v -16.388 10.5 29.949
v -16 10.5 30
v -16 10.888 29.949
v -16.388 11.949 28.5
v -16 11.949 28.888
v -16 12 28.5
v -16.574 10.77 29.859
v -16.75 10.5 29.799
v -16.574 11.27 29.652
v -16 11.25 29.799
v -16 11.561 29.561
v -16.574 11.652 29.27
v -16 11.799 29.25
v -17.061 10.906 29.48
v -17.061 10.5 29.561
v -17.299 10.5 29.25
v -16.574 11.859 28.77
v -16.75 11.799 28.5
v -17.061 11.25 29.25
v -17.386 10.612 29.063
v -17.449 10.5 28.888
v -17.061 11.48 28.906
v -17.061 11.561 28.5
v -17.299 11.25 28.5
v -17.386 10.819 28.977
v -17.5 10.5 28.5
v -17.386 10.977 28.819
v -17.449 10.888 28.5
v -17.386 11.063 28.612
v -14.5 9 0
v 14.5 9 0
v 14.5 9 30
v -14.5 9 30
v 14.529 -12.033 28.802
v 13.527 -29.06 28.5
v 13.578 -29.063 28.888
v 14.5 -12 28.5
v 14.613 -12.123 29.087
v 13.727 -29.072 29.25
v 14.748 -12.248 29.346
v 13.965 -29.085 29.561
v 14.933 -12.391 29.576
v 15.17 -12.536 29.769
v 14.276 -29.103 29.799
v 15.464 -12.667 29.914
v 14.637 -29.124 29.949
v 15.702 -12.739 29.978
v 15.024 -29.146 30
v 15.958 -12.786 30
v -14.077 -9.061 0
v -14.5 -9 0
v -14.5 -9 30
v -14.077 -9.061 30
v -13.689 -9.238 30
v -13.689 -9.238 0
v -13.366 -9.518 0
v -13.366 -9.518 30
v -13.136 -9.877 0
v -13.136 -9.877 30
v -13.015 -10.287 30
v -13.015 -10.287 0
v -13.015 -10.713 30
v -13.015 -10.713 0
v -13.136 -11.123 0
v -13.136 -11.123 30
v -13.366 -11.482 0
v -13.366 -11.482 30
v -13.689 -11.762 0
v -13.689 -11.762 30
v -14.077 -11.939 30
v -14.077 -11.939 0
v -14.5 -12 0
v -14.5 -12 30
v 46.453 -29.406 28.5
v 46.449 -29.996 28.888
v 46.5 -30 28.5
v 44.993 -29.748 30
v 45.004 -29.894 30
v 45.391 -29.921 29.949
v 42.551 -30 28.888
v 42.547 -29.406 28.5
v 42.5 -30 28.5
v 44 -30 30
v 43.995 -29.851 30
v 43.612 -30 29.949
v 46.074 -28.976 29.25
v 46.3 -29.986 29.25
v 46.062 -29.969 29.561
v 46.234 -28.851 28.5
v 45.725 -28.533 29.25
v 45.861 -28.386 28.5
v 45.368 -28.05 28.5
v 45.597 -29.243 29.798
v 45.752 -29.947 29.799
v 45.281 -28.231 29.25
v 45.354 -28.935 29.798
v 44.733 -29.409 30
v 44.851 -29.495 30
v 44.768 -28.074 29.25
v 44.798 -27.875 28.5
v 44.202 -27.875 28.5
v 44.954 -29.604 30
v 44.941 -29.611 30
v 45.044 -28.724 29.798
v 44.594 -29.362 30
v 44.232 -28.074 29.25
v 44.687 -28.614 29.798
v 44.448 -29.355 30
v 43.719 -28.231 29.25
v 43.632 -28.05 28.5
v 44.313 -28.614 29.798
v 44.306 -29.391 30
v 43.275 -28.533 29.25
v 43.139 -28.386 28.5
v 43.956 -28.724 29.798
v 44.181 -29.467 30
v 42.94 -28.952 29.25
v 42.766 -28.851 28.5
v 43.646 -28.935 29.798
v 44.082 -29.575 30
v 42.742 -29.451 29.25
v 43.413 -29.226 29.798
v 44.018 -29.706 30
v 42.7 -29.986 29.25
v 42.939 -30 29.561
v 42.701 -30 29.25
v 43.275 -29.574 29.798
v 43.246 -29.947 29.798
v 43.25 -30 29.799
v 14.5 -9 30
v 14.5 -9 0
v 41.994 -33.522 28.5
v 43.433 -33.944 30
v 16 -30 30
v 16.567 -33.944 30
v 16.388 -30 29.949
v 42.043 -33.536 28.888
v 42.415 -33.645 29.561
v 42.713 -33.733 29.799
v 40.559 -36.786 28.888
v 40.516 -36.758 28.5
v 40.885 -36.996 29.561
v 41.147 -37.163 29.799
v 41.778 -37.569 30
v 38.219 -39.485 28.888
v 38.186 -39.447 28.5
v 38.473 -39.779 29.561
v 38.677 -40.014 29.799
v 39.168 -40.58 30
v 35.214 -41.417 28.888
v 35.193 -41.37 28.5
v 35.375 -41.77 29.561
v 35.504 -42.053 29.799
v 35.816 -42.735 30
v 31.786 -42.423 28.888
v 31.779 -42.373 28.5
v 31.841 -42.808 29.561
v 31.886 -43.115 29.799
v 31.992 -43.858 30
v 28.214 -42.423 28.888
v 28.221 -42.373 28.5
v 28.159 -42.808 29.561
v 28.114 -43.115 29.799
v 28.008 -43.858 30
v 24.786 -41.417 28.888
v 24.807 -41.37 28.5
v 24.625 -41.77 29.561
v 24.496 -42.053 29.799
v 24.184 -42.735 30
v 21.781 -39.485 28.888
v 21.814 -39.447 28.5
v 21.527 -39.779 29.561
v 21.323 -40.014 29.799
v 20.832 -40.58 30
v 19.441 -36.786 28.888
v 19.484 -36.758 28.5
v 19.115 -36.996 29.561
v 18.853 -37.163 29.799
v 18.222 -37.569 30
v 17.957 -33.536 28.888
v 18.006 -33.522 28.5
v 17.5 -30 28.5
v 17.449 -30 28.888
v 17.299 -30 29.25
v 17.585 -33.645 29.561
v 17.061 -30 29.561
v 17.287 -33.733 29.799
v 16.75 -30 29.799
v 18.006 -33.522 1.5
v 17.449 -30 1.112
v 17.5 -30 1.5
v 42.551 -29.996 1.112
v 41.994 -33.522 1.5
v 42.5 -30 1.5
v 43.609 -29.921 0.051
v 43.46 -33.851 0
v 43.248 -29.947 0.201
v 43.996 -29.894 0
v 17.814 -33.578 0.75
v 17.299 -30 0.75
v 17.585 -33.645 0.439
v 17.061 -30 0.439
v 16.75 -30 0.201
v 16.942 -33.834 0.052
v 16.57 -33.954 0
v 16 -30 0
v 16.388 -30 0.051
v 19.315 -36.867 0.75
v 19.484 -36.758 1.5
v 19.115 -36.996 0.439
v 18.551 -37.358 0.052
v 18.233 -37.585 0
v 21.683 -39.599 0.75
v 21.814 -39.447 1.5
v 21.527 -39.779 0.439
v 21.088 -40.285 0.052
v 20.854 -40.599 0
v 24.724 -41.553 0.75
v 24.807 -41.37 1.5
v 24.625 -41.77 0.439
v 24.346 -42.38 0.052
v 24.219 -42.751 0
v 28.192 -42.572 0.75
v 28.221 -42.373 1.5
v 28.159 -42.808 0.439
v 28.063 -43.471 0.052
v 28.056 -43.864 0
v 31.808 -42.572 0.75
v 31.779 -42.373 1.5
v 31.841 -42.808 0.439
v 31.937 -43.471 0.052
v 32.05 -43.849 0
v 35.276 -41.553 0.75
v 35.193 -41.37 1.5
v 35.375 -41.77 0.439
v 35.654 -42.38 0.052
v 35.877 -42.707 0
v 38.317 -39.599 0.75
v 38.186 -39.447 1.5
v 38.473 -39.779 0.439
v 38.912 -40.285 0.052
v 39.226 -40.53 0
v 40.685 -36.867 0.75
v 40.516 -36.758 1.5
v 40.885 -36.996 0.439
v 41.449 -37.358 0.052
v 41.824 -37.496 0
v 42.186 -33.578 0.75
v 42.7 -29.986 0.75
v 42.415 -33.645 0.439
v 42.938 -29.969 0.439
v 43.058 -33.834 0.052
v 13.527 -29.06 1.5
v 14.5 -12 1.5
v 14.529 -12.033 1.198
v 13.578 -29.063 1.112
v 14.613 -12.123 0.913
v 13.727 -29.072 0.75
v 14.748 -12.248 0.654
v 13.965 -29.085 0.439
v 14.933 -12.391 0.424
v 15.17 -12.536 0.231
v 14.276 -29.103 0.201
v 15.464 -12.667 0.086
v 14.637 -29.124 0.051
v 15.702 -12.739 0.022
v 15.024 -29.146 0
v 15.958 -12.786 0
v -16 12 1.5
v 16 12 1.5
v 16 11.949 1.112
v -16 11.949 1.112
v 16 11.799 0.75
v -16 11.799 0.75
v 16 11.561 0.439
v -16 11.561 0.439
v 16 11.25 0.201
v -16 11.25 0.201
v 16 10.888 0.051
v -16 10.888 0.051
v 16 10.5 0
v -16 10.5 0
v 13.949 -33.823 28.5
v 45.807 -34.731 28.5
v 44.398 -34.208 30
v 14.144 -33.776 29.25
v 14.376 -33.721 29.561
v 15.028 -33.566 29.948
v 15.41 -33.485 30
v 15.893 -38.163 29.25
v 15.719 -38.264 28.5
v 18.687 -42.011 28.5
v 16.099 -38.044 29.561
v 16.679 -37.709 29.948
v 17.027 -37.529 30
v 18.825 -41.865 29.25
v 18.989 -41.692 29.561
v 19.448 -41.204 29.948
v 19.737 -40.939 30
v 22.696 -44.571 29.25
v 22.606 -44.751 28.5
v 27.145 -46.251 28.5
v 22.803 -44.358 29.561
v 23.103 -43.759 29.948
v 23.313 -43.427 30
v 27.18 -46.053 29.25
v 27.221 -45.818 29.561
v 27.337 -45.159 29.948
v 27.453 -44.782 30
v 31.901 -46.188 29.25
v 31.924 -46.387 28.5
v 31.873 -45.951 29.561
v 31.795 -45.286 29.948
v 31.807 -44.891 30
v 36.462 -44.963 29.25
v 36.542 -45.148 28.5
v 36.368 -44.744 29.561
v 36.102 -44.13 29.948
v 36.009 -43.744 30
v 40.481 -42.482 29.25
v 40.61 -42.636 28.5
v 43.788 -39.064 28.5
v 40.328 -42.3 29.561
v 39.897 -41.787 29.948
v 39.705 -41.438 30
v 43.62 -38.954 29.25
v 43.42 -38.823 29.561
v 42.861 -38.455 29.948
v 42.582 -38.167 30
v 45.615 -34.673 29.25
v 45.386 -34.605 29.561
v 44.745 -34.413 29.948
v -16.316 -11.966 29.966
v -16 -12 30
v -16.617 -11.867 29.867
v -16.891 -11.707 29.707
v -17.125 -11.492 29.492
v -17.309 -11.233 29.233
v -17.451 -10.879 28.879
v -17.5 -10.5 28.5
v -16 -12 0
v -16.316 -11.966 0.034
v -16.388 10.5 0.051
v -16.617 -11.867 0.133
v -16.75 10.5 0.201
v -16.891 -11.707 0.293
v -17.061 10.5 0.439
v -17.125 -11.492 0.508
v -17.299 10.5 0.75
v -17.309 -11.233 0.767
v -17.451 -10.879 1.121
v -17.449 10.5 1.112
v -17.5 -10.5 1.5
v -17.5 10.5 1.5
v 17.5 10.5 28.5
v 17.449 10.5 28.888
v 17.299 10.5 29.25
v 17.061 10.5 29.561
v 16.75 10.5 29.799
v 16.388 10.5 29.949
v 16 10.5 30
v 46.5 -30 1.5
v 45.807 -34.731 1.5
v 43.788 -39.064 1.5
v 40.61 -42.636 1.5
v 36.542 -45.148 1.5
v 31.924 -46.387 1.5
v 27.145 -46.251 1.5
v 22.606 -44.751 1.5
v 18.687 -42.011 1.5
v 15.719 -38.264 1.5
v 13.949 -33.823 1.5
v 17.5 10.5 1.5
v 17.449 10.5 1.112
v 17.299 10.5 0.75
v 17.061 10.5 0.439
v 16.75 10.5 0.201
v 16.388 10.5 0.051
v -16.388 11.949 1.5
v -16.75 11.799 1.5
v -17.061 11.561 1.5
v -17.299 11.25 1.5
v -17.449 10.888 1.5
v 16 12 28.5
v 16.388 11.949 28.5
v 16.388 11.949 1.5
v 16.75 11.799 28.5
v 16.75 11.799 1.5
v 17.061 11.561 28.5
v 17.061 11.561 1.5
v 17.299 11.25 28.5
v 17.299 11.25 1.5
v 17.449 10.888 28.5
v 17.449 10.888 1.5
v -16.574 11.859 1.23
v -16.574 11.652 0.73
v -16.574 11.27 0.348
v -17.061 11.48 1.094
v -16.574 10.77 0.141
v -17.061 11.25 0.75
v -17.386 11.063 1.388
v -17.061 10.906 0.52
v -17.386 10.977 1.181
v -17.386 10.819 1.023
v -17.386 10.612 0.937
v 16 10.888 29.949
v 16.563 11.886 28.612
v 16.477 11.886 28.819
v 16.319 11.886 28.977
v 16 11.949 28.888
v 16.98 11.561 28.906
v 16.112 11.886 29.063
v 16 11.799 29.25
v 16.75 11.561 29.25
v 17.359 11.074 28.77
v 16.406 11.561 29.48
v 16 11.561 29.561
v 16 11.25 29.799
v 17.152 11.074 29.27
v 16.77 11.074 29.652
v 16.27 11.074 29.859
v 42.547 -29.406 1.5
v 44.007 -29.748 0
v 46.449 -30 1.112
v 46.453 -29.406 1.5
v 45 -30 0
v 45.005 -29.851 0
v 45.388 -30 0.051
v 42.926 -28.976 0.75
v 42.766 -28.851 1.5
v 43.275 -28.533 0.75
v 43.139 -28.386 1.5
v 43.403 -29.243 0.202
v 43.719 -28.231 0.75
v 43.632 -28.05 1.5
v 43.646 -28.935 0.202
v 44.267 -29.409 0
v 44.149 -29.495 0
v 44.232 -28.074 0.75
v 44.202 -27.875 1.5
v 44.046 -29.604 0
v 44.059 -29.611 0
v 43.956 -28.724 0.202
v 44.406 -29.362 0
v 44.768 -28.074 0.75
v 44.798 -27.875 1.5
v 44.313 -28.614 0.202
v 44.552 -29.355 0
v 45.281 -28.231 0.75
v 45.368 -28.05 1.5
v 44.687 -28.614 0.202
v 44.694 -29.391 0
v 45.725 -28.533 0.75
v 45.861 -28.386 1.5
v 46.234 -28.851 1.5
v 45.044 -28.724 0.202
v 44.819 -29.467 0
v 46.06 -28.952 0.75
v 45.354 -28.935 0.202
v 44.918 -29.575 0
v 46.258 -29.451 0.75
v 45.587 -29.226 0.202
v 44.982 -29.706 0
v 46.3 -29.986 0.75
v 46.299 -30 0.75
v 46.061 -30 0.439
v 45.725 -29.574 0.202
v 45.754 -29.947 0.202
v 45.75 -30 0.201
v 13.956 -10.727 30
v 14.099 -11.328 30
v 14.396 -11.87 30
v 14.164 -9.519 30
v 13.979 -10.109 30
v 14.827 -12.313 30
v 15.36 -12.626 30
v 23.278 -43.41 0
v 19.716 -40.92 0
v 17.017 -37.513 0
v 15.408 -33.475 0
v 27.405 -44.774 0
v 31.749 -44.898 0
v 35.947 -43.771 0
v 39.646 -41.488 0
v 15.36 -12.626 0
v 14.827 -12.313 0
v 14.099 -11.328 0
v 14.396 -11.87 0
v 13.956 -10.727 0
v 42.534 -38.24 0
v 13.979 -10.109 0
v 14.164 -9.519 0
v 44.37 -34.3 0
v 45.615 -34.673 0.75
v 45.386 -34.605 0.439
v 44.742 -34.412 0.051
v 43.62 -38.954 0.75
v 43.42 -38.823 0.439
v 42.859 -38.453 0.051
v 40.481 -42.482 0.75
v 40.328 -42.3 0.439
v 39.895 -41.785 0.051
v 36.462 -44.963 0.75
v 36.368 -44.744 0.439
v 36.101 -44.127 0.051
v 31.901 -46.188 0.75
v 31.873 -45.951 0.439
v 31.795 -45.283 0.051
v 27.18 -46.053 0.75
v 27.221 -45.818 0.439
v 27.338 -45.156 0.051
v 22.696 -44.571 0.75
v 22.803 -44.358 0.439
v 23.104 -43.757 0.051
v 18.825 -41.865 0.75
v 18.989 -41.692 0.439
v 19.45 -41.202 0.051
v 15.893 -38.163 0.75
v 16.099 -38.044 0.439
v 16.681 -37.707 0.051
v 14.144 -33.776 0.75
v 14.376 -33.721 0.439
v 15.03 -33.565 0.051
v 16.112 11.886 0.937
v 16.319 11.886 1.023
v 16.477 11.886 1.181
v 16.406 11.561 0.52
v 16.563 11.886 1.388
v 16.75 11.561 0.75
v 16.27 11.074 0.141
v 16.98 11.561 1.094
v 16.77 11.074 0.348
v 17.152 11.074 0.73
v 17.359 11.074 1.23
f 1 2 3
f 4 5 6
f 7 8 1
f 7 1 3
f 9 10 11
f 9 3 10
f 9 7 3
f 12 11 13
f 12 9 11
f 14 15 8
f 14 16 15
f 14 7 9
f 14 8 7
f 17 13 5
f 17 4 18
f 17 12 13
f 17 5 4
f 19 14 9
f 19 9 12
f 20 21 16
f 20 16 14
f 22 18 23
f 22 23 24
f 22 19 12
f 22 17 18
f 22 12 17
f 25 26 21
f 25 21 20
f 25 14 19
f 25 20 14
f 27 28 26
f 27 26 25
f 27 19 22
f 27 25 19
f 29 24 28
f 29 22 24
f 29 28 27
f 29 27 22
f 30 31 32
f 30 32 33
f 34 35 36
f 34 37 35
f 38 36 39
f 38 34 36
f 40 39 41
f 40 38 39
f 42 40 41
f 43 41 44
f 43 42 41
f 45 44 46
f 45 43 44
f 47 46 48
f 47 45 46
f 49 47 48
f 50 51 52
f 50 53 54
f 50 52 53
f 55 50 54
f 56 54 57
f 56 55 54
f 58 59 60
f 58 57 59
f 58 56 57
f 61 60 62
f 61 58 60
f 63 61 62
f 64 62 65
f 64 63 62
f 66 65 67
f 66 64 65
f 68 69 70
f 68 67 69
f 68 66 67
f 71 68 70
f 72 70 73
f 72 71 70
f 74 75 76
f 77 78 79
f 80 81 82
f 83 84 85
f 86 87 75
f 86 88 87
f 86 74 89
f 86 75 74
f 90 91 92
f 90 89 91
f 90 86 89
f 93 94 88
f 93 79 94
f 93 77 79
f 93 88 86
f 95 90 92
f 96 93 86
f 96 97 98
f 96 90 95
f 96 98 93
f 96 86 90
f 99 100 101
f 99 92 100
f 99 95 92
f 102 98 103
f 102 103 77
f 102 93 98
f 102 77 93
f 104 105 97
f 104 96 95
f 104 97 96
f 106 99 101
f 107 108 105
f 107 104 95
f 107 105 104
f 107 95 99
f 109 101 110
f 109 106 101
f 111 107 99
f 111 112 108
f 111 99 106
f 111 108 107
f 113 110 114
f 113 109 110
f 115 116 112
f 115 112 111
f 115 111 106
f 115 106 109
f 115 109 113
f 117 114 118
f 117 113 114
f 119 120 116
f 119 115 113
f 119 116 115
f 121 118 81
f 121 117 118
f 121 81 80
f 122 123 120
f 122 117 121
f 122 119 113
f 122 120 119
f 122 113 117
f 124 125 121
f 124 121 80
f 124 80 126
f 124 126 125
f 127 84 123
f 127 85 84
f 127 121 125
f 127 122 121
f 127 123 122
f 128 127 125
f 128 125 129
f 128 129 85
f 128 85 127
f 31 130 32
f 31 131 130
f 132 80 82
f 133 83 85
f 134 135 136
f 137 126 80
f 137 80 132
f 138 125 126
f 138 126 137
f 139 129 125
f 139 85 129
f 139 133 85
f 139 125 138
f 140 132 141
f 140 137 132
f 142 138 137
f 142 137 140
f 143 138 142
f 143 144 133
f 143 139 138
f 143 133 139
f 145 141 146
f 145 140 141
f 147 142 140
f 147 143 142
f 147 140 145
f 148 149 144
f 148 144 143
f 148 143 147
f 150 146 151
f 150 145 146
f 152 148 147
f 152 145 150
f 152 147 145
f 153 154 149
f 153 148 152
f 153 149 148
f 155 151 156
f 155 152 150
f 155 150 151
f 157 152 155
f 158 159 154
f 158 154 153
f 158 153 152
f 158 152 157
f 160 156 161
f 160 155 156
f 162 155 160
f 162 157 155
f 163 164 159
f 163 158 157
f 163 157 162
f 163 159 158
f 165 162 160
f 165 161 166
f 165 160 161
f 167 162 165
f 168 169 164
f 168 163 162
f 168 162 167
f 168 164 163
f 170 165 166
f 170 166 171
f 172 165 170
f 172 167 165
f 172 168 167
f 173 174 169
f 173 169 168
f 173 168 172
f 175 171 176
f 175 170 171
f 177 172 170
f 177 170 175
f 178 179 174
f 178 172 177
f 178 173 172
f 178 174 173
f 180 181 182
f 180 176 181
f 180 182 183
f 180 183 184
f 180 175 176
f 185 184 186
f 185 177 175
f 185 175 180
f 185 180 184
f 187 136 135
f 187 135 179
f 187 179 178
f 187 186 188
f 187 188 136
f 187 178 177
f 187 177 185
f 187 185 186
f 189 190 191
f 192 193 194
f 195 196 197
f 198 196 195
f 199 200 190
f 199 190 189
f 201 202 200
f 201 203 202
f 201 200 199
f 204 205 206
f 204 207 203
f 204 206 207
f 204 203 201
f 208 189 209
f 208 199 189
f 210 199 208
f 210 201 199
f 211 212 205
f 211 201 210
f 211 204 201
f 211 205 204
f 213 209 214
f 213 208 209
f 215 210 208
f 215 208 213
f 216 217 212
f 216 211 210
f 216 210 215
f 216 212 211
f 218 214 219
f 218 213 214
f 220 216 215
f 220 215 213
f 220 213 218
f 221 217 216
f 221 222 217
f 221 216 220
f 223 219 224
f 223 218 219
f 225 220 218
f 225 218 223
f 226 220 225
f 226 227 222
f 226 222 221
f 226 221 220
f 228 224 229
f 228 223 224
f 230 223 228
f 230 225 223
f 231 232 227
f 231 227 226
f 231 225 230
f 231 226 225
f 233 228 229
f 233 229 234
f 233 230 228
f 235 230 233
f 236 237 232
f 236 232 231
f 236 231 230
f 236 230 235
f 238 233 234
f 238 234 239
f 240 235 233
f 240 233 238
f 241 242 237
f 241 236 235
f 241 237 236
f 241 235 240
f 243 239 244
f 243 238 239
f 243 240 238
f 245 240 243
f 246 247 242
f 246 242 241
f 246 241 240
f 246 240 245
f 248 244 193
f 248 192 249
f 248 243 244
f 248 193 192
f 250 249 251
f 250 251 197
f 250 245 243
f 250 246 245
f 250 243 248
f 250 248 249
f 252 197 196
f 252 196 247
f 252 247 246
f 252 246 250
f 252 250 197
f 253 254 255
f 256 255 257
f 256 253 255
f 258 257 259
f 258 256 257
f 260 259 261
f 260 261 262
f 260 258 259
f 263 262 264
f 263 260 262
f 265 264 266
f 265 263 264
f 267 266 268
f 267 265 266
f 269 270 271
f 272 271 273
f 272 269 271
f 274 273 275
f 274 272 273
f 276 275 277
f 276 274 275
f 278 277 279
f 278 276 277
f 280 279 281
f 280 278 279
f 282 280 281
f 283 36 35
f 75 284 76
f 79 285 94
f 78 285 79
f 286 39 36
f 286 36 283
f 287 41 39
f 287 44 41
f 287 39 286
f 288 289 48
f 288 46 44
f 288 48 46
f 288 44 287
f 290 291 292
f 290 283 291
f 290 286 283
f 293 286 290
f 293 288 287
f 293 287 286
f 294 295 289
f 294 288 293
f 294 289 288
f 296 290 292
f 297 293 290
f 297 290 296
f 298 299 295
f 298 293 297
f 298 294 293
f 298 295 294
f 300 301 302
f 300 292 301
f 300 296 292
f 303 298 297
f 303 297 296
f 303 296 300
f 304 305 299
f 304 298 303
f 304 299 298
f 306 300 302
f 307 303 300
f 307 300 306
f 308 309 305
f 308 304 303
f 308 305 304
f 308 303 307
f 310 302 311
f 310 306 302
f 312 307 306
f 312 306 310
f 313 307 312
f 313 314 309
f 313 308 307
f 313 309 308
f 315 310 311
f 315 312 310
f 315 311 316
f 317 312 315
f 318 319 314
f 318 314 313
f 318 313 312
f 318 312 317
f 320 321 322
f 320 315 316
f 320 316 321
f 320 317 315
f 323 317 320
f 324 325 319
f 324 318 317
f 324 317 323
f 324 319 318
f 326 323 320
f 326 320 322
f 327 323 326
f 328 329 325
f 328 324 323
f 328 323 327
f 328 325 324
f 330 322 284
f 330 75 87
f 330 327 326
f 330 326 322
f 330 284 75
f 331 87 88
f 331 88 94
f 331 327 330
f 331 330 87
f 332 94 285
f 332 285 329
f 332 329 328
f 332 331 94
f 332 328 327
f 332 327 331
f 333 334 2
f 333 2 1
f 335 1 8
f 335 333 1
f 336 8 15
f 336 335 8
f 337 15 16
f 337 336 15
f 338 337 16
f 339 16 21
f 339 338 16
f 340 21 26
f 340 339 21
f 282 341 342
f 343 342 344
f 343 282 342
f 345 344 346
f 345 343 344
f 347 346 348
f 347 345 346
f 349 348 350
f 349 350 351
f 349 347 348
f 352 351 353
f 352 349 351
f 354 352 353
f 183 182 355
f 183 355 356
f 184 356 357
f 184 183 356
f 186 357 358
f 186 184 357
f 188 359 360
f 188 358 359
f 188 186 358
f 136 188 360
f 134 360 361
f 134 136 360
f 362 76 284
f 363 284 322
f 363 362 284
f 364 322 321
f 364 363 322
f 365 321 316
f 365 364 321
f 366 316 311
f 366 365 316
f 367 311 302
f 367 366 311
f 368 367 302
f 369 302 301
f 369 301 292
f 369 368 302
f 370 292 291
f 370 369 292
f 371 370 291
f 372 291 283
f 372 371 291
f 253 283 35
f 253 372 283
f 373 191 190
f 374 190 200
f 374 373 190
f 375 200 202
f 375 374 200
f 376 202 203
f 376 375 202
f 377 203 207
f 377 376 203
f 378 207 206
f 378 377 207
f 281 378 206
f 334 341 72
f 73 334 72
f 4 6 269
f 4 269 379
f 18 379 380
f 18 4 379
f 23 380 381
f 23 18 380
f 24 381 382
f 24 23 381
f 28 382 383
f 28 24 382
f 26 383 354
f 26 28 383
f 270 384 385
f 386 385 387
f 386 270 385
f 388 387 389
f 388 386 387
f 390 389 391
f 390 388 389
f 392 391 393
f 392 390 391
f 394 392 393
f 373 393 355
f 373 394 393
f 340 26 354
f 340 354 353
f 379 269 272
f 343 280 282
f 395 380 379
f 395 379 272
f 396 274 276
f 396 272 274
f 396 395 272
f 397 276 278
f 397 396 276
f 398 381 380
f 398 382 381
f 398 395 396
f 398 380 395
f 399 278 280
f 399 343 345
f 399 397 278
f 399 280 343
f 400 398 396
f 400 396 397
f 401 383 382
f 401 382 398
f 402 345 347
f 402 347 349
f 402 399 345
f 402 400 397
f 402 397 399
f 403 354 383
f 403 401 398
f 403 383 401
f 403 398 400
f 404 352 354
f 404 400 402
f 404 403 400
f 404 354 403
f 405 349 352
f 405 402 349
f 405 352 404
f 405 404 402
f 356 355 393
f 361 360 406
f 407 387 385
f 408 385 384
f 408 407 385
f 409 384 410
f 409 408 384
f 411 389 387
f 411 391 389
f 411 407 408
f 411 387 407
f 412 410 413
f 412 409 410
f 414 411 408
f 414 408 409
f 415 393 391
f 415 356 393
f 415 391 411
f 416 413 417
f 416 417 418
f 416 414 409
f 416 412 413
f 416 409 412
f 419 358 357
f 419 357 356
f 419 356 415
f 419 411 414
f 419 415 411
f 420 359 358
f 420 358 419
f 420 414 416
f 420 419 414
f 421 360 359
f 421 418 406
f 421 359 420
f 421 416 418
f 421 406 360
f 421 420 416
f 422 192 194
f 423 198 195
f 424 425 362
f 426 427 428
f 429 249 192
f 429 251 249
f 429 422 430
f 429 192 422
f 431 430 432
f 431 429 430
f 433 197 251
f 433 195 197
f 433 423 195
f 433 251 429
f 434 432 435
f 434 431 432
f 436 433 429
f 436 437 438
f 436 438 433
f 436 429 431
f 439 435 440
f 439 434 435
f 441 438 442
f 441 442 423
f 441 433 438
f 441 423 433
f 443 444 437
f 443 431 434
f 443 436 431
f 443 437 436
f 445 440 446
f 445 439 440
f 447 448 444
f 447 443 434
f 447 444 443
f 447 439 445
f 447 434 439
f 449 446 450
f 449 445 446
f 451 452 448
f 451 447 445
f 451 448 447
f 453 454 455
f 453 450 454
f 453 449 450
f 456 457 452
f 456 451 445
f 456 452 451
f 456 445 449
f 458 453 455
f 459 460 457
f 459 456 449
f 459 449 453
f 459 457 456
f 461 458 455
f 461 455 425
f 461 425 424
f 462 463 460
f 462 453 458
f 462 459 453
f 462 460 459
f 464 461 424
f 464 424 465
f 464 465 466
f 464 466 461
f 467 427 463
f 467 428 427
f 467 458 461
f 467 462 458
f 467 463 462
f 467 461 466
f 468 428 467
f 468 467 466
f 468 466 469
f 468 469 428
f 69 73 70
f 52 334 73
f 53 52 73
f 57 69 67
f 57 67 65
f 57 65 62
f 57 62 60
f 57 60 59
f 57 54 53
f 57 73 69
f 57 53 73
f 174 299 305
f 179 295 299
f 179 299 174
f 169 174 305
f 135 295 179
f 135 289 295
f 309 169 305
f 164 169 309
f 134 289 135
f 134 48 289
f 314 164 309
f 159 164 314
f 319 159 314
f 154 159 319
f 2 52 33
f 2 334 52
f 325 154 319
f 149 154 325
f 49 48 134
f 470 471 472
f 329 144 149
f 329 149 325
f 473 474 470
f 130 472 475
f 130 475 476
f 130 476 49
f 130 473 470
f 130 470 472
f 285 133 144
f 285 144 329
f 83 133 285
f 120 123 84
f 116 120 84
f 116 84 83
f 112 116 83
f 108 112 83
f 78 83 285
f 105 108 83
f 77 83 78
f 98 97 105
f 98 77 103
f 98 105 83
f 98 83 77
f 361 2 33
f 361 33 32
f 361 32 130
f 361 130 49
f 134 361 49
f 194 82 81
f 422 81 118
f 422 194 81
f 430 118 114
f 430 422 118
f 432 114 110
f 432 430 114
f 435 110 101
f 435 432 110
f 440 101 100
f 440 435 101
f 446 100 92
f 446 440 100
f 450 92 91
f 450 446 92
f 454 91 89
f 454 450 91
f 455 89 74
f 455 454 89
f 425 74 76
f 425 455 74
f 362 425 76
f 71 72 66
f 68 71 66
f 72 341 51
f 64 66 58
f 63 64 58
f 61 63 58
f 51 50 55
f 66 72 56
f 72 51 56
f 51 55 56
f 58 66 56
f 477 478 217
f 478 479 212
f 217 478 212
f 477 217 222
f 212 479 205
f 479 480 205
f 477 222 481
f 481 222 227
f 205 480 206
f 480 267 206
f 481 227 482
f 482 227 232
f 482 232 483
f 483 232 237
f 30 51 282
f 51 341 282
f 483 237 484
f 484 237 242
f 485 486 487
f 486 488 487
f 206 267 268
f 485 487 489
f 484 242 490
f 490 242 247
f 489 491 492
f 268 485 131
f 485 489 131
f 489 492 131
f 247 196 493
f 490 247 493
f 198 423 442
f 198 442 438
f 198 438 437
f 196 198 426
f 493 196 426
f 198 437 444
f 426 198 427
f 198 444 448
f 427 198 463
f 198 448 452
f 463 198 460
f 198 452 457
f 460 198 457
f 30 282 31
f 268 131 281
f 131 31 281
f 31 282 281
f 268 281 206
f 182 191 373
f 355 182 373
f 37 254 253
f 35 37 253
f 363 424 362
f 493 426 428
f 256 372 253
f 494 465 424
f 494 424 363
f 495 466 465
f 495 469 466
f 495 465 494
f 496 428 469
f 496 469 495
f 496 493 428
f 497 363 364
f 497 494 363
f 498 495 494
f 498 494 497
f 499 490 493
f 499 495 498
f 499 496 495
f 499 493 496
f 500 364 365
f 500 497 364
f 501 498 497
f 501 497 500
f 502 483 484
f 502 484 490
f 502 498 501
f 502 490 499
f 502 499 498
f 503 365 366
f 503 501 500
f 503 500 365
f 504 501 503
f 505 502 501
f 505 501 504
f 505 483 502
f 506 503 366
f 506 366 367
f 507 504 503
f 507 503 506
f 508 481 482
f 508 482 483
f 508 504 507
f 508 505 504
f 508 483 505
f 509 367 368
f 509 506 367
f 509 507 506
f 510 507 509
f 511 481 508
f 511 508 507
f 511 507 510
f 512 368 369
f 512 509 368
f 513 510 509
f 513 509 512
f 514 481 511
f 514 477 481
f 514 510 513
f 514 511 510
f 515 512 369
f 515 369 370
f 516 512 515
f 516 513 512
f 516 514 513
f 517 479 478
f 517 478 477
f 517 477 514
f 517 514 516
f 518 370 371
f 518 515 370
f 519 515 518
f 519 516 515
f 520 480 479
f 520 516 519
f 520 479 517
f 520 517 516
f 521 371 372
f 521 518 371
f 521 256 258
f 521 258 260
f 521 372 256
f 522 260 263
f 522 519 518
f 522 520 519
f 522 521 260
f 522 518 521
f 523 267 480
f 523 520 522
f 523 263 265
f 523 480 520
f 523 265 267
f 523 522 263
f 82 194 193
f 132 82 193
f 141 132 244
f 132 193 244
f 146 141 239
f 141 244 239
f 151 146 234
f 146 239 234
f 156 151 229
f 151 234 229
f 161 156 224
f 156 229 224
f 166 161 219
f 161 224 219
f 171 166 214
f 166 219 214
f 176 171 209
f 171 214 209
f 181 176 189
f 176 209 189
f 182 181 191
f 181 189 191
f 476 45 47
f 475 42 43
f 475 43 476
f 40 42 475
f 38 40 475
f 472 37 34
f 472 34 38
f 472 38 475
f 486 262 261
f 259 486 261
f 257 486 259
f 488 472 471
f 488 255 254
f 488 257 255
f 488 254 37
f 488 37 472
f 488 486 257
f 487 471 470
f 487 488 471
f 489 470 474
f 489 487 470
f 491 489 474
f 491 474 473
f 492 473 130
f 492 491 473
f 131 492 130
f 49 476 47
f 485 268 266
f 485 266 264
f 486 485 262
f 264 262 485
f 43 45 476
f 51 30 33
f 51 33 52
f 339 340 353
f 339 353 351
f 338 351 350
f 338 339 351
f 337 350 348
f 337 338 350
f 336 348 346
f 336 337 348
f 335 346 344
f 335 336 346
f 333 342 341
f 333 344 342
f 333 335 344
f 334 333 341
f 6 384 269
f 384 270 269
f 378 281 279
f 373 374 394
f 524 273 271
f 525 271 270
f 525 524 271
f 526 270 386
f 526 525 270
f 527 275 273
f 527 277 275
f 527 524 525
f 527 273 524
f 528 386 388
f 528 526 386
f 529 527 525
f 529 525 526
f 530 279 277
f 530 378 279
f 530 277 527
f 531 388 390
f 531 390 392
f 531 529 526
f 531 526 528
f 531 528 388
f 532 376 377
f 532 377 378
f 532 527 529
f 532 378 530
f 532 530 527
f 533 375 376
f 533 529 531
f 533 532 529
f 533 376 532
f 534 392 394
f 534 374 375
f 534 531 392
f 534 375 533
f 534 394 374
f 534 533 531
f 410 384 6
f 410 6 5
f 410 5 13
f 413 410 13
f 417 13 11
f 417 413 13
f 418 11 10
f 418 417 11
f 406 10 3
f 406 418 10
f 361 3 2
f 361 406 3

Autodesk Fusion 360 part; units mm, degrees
sketch "Sketch1" plane through (0, 0, 0) normal (0, 0, 1) x (1, 0, 0)
  line L0 (14.5, 9) -> (-14.5, 9)
  line L1 (-14.5, 9) -> (-14.5, -9)
  line L2 (14.5, -9) -> (14.5, 9)
  line L3 (14.5, 9) -> (-14.5, -9) construction
  line L4 (-14.5, 9) -> (14.5, -9) construction
  line L5 (17.5, -12) -> (17.5, 12)
  line L6 (17.5, 12) -> (-17.5, 12)
  line L7 (-17.5, 12) -> (-17.5, -12)
  arc A0 (14.5, -9) -> (14.5, -12) centre (16.25, -10.5) ccw
  arc A1 (-14.5, -12) -> (-14.5, -9) centre (-14.5, -10.5) ccw
  line L8 (-17.5, -12) -> (-14.5, -12)
  line L9 (17.5, -12) -> (17.5, -30)
  line L10 (14.5, -12) -> (13.5268, -29.0603)
  arc A2 (17.5, -29.9983) -> (42.5, -30) centre (30, -30) ccw
  arc A3 (13.5268, -29.0603) -> (46.5, -30) centre (30, -30) ccw
  arc A4 (46.5, -30) -> (42.5, -30) centre (44.5, -29.8577) ccw
  dimension "d1" = 29
  dimension "d2" = 18
  dimension "d4" = 25
  dimension "d5" = 33
extrude "Extrude1" add sketch "Sketch1" along normal blind 30
fillet "Fillet1" radius 1.5 5 edges at (29.9991, -42.5, 30) (17.5, -8.9991, 30) (44.5, -27.8527, 30) (14.0134, -20.5301, 30) (29.5299, -46.4933, 30)
fillet "Fillet2" radius 1.5 5 edges at (17.5, -8.9991, 0) (29.9991, -42.5, 0) (44.5, -27.8527, 0) (14.0134, -20.5301, 0) (29.5299, -46.4933, 0)
fillet "Fillet3" radius 1.5 5 edges at (-0.75, 12, 0) (17.0607, 12, 0.4393) (17.5, 12, 15) (17.0607, 12, 29.5607) (-0.75, 12, 30)
fillet "Fillet4" radius 1.5 1 faces at (-17.5, -4, 19.5)
